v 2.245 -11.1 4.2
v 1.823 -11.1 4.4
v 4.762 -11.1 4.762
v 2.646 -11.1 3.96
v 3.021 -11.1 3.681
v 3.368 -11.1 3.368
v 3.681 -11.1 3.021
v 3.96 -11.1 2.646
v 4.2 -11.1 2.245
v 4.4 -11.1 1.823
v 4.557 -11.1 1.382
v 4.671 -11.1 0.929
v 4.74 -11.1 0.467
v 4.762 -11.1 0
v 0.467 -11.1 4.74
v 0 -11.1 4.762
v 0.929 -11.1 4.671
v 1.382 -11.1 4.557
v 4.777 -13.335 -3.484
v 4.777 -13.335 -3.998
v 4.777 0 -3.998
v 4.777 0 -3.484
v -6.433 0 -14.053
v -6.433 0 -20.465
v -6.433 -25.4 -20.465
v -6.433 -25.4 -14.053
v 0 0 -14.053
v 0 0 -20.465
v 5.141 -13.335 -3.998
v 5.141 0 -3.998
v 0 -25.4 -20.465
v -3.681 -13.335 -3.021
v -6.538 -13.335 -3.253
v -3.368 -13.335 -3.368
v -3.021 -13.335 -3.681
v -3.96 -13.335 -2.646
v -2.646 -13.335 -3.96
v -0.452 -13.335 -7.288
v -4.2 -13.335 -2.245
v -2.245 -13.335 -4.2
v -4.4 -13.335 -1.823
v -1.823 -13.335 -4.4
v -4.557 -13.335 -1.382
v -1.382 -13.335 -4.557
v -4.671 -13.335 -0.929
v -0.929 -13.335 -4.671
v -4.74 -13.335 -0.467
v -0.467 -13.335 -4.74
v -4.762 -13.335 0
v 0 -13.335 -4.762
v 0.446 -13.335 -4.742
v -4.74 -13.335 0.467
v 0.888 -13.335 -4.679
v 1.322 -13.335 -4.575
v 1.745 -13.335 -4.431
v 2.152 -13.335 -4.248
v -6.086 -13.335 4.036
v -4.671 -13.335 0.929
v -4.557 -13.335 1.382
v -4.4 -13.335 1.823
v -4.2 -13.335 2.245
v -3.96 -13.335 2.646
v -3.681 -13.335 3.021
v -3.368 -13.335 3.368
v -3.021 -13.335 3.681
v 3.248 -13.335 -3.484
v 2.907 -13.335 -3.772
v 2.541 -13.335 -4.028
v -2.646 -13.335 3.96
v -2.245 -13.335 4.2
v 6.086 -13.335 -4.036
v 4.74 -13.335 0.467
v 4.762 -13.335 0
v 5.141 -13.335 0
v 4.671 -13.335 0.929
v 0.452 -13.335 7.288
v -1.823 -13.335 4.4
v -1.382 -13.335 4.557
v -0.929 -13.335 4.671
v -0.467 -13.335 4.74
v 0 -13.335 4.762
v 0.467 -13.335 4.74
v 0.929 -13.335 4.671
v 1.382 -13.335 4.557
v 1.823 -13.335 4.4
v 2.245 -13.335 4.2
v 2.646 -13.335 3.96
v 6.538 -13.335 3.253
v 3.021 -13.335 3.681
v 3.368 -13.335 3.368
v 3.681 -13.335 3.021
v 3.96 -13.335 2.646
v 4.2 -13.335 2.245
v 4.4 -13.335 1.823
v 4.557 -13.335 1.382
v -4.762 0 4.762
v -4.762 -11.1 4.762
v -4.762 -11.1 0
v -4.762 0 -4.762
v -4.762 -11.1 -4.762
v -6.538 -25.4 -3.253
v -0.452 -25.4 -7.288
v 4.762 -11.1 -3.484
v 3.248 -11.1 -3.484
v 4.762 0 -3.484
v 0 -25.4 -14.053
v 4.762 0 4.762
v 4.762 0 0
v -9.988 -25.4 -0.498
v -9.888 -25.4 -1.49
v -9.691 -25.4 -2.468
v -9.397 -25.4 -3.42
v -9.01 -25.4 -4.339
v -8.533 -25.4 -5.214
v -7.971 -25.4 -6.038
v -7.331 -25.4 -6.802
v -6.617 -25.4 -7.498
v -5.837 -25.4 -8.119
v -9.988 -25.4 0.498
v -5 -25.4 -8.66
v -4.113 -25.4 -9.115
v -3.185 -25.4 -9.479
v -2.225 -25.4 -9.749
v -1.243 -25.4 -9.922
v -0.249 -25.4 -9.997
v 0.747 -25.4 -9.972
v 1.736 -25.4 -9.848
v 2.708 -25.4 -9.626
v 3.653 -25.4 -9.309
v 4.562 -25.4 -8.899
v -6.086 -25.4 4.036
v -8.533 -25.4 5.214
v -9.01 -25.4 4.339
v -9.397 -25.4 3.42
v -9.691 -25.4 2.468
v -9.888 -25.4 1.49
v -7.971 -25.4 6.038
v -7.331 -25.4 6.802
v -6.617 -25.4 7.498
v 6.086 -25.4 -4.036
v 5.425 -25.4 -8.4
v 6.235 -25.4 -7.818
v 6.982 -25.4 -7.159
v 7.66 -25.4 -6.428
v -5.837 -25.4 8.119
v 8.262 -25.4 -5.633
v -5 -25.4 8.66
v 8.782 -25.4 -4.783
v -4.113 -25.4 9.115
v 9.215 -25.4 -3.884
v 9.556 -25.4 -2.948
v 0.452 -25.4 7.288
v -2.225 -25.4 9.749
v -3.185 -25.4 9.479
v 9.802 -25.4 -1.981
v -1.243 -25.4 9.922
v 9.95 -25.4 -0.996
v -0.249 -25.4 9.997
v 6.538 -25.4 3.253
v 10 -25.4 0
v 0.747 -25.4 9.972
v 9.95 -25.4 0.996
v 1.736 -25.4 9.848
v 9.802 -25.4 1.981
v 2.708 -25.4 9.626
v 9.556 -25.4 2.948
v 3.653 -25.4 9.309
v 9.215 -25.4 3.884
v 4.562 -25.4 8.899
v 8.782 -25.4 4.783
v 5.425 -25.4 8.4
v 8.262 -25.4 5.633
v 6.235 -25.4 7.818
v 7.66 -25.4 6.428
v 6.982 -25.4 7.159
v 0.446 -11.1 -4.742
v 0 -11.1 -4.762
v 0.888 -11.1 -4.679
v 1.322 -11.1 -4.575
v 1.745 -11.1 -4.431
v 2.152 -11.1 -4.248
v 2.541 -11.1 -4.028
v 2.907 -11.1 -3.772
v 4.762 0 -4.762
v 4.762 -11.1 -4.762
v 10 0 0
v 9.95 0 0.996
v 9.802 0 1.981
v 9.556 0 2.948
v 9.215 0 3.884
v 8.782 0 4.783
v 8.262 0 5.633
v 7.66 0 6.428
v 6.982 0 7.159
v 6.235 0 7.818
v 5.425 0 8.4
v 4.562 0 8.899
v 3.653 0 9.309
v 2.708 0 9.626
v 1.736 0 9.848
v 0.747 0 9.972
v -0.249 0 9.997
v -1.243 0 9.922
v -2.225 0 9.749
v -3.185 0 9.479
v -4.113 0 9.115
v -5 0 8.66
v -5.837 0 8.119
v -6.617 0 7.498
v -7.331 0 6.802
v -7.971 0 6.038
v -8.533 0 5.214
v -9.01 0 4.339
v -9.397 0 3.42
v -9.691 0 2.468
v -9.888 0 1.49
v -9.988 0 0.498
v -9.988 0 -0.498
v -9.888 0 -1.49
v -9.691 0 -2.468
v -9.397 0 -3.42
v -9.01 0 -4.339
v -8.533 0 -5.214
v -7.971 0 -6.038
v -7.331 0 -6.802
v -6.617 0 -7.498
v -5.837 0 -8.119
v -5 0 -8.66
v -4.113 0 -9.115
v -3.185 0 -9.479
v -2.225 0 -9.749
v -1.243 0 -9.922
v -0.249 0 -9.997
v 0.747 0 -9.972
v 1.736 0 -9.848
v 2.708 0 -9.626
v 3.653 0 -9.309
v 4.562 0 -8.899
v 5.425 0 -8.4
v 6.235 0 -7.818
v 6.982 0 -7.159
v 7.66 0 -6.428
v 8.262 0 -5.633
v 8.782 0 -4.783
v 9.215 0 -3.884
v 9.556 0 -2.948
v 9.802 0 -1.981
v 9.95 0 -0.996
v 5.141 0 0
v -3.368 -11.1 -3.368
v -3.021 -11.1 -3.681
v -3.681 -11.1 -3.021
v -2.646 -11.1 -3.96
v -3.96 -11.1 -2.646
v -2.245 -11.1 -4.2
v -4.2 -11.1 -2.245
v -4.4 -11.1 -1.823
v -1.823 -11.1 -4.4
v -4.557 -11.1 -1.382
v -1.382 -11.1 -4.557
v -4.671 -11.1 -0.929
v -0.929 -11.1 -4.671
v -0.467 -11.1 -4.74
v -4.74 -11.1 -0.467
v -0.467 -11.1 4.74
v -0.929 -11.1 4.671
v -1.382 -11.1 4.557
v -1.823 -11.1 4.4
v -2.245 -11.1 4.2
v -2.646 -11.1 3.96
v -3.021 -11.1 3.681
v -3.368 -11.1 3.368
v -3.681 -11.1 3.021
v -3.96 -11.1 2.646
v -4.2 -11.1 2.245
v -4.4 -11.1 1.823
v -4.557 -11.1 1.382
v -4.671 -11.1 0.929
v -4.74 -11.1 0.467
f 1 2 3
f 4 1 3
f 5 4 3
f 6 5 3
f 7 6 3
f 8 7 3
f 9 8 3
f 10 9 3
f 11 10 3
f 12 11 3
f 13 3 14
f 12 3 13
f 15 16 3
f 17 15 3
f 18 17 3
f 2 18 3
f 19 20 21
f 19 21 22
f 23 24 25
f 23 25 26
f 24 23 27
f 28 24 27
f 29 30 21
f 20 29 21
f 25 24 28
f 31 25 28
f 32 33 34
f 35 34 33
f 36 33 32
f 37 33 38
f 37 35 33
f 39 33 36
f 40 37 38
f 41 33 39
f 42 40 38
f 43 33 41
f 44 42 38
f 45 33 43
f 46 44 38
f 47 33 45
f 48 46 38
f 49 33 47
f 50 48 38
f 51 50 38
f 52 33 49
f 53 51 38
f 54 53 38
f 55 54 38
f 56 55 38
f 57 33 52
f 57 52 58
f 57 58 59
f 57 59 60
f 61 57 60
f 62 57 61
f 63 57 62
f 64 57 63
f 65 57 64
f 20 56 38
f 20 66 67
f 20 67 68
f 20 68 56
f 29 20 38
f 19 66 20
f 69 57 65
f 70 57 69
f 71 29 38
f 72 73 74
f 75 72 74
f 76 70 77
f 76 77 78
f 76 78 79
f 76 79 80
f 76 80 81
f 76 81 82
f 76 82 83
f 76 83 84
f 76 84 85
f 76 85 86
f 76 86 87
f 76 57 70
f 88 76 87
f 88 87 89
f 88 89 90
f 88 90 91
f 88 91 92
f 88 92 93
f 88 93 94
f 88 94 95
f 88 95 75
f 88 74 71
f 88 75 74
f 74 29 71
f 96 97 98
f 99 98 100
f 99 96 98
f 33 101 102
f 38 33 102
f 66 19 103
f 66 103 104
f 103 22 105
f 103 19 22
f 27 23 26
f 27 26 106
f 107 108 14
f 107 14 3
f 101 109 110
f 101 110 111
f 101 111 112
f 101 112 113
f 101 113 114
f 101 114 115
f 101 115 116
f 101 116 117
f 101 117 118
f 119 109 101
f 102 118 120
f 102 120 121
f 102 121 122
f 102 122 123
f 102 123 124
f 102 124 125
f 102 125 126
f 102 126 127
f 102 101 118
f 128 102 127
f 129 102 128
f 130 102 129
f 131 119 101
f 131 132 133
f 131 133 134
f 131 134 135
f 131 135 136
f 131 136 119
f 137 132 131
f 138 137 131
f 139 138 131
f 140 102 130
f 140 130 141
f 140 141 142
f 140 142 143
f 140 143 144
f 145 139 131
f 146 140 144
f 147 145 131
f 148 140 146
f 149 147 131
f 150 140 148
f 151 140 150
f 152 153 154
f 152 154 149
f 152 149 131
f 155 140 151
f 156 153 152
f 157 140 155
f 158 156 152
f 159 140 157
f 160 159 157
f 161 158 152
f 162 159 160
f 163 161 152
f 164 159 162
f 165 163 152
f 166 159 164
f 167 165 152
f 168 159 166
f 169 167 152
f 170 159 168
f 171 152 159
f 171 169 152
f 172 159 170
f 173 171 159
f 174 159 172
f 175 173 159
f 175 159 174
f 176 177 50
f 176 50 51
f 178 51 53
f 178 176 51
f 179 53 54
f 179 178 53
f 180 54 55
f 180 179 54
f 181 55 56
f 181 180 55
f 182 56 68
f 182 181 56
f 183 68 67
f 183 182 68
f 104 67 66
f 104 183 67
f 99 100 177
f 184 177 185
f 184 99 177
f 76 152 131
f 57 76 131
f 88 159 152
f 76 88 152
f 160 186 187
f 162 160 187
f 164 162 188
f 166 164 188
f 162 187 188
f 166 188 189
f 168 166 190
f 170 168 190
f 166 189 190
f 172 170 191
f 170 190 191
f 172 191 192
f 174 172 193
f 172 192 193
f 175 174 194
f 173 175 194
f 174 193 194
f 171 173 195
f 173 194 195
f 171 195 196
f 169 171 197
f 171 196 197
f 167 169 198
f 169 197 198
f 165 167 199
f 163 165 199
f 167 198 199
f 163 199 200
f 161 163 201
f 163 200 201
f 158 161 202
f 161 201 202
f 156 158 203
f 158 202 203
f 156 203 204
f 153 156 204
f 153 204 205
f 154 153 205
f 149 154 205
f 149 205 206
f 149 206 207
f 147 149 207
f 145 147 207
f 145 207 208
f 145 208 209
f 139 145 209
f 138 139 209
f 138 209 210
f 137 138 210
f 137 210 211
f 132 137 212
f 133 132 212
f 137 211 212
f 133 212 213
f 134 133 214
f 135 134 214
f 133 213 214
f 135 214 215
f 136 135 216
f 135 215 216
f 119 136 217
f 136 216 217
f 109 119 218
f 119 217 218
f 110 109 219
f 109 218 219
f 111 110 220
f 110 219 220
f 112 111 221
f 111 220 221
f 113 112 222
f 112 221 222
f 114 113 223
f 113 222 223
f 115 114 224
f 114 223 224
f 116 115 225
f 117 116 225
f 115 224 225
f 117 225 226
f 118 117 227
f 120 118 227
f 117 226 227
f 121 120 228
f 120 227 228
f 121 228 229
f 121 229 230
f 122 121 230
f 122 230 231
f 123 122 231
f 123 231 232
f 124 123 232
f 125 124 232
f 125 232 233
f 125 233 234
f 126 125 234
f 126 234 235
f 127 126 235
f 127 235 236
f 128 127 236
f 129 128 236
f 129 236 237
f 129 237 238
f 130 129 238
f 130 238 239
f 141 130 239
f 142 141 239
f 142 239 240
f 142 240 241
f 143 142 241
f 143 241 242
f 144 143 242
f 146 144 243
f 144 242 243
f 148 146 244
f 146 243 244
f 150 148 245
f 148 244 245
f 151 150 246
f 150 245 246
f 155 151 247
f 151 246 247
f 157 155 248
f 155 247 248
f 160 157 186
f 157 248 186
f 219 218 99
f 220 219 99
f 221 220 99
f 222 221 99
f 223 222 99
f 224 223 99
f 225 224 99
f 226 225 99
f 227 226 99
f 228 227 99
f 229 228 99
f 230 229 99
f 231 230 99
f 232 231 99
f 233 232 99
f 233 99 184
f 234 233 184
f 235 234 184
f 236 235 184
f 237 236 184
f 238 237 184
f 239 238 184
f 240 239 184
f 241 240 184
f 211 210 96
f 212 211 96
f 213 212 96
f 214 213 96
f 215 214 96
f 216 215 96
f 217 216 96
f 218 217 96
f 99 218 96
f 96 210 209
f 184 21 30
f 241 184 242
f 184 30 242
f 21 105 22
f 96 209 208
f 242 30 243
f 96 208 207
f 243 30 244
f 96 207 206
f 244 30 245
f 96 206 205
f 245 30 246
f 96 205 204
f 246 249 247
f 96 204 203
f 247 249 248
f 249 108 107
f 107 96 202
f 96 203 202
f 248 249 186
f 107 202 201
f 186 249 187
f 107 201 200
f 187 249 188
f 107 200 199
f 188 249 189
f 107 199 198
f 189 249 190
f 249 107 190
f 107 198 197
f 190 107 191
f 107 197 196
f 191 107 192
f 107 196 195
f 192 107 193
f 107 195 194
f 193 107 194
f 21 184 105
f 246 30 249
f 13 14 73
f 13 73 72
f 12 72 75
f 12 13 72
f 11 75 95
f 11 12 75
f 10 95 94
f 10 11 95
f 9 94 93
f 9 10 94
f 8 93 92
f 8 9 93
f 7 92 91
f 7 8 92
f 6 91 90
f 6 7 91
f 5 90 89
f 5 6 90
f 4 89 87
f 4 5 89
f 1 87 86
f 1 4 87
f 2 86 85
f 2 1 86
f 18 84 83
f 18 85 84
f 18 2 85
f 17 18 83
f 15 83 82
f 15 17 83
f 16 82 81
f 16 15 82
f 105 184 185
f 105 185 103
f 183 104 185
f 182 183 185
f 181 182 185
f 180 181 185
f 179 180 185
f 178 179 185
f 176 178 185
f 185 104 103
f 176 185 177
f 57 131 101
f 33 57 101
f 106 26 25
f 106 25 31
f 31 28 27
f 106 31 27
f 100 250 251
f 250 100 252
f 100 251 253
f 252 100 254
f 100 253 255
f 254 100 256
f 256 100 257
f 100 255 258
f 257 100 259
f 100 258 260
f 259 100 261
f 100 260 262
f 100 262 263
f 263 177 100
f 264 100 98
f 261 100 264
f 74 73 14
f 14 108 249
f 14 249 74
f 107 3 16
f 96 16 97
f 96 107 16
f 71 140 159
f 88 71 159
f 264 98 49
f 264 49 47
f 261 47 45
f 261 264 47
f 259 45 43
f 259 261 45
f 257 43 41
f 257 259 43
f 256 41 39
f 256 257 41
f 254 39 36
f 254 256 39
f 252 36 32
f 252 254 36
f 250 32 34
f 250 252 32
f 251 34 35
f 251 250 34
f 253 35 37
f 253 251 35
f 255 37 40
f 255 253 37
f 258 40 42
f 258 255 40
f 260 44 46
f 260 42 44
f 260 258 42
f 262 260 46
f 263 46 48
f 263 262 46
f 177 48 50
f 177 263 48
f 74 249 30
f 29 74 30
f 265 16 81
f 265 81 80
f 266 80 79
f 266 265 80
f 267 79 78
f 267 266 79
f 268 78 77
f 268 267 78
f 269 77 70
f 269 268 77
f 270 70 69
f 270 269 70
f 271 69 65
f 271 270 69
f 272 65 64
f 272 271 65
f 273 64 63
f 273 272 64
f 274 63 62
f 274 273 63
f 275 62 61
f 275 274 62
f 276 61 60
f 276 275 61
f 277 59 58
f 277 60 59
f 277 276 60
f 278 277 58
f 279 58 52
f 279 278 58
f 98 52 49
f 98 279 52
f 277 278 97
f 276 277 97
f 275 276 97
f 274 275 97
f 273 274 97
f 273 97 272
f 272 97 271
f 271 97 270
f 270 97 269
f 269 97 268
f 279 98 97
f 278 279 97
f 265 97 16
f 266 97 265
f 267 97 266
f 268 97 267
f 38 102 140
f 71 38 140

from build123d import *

# Parameters (mm, degrees)
F0_R     = 10
F0_W     = 6.433372
F0_H     = 6.412095
F1_DEPTH = 25.4
F3_DEPTH = 25.401
F4_DEPTH = 11.0998
F6_DEPTH = 12.065


with BuildPart() as f1:
    # F0 (on Front) → F1 (new body)
    with BuildSketch(Plane.XZ):
        Circle(F0_R)
        Polygon((0, -3.483541), (0, 0), (5.140638, 0), (5.140638, -3.483541), (5.140638, -3.998414), (4.776574, -3.998414), (4.776574, -3.483541), align=None, mode=Mode.SUBTRACT)
        with Locations((-3.216686, -17.259291)):
            Rectangle(F0_W, F0_H)
    extrude(amount=F1_DEPTH)

    # F2 (on Front) → F3 (cut, through all)
    with BuildSketch(Plane.XZ):
        with BuildLine():
            ThreePointArc((-4.7625, 0), (-3.367596, -3.367596), (0, -4.7625))
            ThreePointArc((0, -4.7625), (3.367596, -3.367596), (4.7625, 0))
            ThreePointArc((4.7625, 0), (3.367596, 3.367596), (0, 4.7625))
            ThreePointArc((0, 4.7625), (-3.367596, 3.367596), (-4.7625, 0))
        make_face()
    extrude(amount=F3_DEPTH, mode=Mode.SUBTRACT)

    # F2 (on Front) → F4 (cut)
    with BuildSketch(Plane.XZ):
        with BuildLine():
            Line((0, -4.7625), (4.7625, -4.7625))
            Line((4.7625, -4.7625), (4.7625, 0))
            ThreePointArc((4.7625, 0), (3.367596, -3.367596), (0, -4.7625))
        make_face()
        with BuildLine():
            Line((-4.7625, -4.7625), (0, -4.7625))
            ThreePointArc((0, -4.7625), (-3.367596, -3.367596), (-4.7625, 0))
            Line((-4.7625, 0), (-4.7625, -4.7625))
        make_face()
        with BuildLine():
            ThreePointArc((0, 4.7625), (3.367596, 3.367596), (4.7625, 0))
            Line((4.7625, 0), (4.7625, 4.7625))
            Line((4.7625, 4.7625), (0, 4.7625))
        make_face()
        with BuildLine():
            Line((-4.7625, 4.7625), (-4.7625, 0))
            ThreePointArc((-4.7625, 0), (-3.367596, 3.367596), (0, 4.7625))
            Line((0, 4.7625), (-4.7625, 4.7625))
        make_face()
    extrude(amount=F4_DEPTH, mode=Mode.SUBTRACT)

    # F5 (on face) → F6 (cut)
    with BuildSketch(Plane.XZ.offset(25.4)):
        Polygon((6.538104, 3.252645), (0.452179, 7.288487), (-6.085925, 4.035842), (-6.538104, -3.252645), (-0.452179, -7.288487), (6.085925, -4.035842), align=None)
    extrude(amount=-F6_DEPTH, mode=Mode.SUBTRACT)


solid = f1.part
